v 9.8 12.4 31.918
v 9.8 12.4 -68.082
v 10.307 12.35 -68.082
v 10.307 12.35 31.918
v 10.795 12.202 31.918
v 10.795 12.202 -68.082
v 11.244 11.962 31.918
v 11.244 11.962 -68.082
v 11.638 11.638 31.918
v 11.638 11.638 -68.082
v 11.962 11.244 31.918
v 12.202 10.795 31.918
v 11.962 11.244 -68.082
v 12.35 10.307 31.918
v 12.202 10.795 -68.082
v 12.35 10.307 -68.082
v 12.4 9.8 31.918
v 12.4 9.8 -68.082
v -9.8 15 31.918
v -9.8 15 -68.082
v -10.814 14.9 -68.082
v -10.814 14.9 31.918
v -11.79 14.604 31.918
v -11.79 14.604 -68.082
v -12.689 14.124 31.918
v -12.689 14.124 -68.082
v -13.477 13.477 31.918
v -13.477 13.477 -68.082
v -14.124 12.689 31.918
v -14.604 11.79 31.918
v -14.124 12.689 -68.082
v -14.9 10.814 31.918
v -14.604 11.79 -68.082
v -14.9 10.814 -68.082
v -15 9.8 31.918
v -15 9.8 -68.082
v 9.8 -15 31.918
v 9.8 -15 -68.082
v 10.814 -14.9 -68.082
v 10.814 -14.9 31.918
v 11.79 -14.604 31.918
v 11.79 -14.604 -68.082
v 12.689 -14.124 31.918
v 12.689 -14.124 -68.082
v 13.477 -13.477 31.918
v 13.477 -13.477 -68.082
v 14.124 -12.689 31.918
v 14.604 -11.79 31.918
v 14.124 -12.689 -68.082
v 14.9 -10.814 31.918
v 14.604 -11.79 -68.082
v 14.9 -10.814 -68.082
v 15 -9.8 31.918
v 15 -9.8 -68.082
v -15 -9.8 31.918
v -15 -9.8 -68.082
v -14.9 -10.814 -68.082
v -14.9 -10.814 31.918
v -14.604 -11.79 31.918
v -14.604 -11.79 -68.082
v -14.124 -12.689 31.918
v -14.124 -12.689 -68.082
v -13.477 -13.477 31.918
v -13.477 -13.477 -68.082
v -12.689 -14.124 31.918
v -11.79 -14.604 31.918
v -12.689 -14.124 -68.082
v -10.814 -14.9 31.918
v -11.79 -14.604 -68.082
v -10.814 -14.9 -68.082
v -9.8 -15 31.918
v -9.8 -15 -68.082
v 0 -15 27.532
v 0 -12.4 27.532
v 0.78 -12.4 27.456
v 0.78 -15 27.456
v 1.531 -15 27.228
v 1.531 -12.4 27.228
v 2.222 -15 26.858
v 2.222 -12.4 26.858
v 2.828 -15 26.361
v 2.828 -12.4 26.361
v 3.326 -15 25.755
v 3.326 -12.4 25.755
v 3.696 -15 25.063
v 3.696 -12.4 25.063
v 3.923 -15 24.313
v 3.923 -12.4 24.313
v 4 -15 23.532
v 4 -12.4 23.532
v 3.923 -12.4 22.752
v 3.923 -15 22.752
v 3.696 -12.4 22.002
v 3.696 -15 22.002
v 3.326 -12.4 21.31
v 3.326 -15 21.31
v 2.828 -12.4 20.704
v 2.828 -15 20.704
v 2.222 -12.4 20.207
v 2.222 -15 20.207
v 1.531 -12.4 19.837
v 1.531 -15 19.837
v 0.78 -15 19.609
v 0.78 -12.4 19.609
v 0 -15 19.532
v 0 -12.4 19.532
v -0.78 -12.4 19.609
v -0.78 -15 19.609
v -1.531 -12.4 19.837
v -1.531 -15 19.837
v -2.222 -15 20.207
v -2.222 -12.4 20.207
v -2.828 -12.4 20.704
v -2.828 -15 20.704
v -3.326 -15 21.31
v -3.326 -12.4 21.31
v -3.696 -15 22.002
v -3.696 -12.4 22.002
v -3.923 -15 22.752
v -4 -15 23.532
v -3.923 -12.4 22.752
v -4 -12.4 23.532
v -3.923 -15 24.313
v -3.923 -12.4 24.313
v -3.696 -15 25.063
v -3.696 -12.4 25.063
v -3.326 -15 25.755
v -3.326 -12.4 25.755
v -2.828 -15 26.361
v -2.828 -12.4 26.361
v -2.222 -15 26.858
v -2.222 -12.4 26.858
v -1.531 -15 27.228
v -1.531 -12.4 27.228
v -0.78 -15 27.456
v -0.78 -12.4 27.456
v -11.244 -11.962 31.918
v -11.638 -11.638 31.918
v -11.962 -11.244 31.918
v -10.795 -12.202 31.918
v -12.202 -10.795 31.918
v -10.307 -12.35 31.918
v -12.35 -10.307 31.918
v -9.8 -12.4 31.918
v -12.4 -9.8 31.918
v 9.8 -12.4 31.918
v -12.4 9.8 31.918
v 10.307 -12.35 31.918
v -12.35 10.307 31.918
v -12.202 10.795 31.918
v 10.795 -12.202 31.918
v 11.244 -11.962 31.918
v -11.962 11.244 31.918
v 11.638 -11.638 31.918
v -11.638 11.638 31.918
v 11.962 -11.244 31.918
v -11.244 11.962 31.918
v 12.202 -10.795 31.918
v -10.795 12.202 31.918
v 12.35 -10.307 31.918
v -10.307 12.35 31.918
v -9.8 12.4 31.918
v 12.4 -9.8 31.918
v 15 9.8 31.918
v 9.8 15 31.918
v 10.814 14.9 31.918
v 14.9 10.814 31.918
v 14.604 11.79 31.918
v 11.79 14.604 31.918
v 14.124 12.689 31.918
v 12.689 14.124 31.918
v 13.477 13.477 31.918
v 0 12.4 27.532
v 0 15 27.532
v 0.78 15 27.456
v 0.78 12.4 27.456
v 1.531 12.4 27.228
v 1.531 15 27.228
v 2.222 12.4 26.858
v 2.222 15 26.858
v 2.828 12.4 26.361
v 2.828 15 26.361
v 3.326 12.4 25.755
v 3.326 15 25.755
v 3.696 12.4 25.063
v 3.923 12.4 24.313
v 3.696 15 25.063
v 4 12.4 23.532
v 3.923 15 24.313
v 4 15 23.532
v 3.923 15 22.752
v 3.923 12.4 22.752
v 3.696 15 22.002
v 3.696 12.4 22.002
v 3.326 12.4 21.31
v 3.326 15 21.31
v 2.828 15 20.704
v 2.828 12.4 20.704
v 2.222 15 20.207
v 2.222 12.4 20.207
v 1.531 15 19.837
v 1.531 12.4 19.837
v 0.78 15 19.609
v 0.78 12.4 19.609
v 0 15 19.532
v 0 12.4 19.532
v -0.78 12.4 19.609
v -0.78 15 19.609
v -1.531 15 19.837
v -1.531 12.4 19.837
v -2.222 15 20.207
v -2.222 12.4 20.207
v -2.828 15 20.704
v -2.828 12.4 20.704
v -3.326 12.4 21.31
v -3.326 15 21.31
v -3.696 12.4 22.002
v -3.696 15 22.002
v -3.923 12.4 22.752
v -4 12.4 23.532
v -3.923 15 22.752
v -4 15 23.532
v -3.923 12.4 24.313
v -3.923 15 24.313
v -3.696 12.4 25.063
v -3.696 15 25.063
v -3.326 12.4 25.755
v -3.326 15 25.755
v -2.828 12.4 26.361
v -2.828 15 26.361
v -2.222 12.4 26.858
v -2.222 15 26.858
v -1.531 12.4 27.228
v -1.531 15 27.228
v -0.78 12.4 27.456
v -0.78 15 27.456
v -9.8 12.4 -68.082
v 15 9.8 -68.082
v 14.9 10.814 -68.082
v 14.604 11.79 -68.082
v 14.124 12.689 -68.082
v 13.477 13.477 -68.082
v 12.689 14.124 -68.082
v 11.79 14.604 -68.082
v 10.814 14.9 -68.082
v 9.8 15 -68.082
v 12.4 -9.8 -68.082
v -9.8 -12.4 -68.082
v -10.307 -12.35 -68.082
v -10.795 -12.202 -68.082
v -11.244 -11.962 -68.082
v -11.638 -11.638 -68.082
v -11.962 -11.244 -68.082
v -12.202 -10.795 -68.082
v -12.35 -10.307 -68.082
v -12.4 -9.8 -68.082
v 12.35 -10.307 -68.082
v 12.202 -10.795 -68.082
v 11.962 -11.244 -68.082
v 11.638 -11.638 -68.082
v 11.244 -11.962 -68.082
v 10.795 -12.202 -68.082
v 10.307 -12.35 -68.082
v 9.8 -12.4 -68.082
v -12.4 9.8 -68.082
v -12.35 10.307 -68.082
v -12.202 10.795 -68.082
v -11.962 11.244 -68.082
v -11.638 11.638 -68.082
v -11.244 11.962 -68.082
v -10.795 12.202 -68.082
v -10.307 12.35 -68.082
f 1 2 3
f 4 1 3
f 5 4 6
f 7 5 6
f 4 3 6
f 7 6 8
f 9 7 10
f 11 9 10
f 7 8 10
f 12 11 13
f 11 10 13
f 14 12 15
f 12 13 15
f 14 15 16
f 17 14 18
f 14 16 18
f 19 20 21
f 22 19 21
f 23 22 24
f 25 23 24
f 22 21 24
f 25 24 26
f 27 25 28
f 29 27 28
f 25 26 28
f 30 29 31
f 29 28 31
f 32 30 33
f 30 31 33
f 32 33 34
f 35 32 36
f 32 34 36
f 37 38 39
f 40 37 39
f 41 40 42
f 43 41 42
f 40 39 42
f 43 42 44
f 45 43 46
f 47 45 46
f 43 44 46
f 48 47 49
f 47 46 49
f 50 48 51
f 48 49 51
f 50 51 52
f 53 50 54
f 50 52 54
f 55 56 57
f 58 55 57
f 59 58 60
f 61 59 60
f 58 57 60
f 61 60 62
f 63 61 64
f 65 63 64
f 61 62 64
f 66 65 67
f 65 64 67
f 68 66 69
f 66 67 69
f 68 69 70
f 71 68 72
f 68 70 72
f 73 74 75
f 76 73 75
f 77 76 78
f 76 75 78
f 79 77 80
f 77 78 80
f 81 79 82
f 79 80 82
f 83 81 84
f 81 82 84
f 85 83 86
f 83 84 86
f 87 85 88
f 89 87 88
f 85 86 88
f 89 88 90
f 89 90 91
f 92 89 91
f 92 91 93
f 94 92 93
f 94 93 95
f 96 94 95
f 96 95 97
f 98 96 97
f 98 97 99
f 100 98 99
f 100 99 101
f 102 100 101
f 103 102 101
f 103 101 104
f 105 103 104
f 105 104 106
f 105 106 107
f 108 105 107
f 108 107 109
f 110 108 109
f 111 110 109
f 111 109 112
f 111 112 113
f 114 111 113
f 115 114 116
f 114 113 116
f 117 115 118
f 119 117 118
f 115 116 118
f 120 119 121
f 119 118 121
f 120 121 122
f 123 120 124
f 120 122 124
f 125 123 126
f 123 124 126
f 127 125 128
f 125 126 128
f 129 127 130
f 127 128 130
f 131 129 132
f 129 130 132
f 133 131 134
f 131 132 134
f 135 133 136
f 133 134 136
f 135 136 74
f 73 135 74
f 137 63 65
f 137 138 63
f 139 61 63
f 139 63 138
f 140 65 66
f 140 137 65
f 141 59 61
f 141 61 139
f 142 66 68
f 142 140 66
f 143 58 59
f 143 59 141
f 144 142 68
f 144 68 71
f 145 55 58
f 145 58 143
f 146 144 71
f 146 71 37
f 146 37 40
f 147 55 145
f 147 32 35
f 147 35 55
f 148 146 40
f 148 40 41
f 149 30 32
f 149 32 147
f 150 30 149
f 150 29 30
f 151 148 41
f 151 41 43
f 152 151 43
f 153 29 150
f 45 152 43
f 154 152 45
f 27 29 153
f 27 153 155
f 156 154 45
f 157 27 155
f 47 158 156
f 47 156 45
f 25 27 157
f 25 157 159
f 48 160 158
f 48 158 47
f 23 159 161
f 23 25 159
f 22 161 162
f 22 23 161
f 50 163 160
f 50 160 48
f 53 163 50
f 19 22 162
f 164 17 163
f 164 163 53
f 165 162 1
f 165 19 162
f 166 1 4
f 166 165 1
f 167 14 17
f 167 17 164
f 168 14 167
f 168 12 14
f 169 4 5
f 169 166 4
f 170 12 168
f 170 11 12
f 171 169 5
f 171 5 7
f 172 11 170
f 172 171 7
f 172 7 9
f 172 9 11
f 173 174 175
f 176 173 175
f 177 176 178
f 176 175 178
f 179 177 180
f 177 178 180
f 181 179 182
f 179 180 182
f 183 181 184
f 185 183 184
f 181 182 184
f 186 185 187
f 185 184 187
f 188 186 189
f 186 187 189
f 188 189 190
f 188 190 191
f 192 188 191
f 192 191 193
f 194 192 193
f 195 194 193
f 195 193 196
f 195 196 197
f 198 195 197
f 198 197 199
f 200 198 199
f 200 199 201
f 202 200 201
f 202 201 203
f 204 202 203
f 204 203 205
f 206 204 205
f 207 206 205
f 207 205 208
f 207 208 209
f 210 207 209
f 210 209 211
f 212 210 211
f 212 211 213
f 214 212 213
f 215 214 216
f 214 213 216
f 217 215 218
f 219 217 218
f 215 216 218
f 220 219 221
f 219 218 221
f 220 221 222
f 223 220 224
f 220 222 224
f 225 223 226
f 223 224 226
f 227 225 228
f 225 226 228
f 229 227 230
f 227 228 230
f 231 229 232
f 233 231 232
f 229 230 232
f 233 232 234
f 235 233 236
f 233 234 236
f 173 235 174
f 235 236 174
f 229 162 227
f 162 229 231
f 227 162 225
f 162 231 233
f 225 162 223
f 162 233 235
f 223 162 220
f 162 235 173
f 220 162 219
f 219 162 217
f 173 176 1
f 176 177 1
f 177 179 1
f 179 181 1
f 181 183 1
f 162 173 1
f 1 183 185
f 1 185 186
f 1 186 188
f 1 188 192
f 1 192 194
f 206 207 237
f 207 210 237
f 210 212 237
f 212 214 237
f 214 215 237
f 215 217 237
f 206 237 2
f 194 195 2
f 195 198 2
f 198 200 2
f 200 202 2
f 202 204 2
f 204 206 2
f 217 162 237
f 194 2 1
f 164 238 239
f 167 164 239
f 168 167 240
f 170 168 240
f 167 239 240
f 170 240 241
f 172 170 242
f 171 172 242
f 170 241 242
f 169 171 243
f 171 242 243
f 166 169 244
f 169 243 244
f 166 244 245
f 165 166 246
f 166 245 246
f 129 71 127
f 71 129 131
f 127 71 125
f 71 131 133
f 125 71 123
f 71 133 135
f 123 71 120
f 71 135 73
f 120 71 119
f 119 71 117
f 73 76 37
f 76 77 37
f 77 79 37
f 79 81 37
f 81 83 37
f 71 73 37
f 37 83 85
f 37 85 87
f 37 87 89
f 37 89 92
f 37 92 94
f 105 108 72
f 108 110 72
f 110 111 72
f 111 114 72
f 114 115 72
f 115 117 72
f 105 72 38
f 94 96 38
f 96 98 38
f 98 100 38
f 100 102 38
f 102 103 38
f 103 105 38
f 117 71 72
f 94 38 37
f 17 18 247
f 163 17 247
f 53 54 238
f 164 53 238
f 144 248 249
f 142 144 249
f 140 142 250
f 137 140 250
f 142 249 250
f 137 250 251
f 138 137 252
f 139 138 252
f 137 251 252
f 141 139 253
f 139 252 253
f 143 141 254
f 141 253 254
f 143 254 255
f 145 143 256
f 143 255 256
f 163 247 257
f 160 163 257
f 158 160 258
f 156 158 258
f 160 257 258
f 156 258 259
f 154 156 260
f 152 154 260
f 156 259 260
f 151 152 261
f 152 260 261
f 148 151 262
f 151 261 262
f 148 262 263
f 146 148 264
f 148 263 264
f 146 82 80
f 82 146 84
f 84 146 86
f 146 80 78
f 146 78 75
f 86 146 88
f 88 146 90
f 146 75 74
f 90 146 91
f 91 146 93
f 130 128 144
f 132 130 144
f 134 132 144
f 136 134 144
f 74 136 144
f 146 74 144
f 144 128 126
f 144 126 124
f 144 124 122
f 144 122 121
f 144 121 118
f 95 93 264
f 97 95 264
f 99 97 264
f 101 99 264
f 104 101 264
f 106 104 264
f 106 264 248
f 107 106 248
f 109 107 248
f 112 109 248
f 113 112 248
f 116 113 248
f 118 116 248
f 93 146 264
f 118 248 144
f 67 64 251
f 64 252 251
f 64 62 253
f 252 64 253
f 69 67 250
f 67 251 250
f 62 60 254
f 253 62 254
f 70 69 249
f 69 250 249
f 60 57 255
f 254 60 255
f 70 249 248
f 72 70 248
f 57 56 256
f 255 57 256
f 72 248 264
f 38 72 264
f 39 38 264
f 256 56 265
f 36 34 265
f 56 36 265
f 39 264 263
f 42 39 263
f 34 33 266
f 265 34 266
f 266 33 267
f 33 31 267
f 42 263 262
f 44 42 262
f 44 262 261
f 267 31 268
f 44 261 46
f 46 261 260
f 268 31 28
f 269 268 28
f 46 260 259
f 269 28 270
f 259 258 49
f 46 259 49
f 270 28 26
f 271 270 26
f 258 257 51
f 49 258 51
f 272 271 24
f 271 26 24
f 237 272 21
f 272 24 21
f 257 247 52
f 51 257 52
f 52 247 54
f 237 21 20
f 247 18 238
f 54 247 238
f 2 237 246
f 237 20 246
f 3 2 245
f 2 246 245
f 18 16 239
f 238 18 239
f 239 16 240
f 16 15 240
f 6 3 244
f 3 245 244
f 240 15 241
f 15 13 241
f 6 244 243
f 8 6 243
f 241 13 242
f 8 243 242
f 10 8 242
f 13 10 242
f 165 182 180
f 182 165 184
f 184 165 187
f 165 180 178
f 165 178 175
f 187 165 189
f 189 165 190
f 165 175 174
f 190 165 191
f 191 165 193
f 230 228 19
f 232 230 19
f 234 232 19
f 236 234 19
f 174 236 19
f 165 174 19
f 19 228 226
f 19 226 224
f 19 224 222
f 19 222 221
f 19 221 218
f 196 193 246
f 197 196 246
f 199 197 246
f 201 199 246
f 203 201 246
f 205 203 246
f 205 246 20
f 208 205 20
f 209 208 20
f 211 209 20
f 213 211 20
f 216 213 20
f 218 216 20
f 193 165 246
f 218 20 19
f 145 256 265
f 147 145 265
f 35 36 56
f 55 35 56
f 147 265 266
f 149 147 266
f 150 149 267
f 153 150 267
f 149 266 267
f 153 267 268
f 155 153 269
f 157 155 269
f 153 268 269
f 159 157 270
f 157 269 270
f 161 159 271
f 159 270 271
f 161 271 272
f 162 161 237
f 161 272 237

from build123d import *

# Parameters (mm, degrees)
SISTEMA_START              = -68.082035122
SISTEMA_ESTRUCTURAL2_DEPTH = 100
CORTAR_EXTRUIR1_REACH      = 77.896
CROQUIS9_R                 = 4


# Read off the part's stored shape, not the designer's step: Sistema estructural2
with BuildPart() as part:
    # Sistema estructural2 outline → Sistema estructural2 (new body)
    with BuildSketch(Plane.XY.offset(SISTEMA_START)):
        with BuildLine():
            ThreePointArc((15, 9.8), (13.476955262, 13.476955262), (9.8, 15))
            Line((9.8, 15), (-9.8, 15))
            ThreePointArc((-9.8, 15), (-13.476955262, 13.476955262), (-15, 9.8))
            Line((-15, 9.8), (-15, -9.8))
            ThreePointArc((-15, -9.8), (-13.476955262, -13.476955262), (-9.8, -15))
            Line((-9.8, -15), (9.8, -15))
            ThreePointArc((9.8, -15), (13.476955262, -13.476955262), (15, -9.8))
            Line((15, -9.8), (15, 9.8))
        make_face()
        with BuildLine():
            ThreePointArc((12.4, -9.8), (11.638477631, -11.638477631), (9.8, -12.4))
            Line((9.8, -12.4), (-9.8, -12.4))
            ThreePointArc((-9.8, -12.4), (-11.638477631, -11.638477631), (-12.4, -9.8))
            Line((-12.4, -9.8), (-12.4, 9.8))
            ThreePointArc((-12.4, 9.8), (-11.638477631, 11.638477631), (-9.8, 12.4))
            Line((-9.8, 12.4), (9.8, 12.4))
            ThreePointArc((9.8, 12.4), (11.638477631, 11.638477631), (12.4, 9.8))
            Line((12.4, 9.8), (12.4, -9.8))
        make_face(mode=Mode.SUBTRACT)
    extrude(amount=SISTEMA_ESTRUCTURAL2_DEPTH)

    # Cortar-Extruir1: up to this face of the body (flat: up to its plane)
    cortar_extruir1_end = Plane(part.part.faces().sort_by_distance((0, -15, -18.082035122))[0])
    # Croquis9 → Cortar-Extruir1 (cut, up to the picked face)
    with BuildSketch(Plane(origin=(0, 15, 0), x_dir=(1, 0, 0), z_dir=(0, 1, 0)), mode=Mode.PRIVATE) as cortar_extruir1_sk1:
        with Locations(Location((0, -23.532428894, 0), (0, 0, 270))):
            Circle(CROQUIS9_R)
    cortar_extruir1_tool1 = split(extrude(cortar_extruir1_sk1.sketch, amount=-CORTAR_EXTRUIR1_REACH, mode=Mode.PRIVATE), bisect_by=cortar_extruir1_end, keep=Keep.BOTH, mode=Mode.PRIVATE)
    add(cortar_extruir1_tool1.solids().sort_by(Axis((0, 15, 23.532429), (0, -1, 0)))[0], mode=Mode.SUBTRACT)


solid = part.part
